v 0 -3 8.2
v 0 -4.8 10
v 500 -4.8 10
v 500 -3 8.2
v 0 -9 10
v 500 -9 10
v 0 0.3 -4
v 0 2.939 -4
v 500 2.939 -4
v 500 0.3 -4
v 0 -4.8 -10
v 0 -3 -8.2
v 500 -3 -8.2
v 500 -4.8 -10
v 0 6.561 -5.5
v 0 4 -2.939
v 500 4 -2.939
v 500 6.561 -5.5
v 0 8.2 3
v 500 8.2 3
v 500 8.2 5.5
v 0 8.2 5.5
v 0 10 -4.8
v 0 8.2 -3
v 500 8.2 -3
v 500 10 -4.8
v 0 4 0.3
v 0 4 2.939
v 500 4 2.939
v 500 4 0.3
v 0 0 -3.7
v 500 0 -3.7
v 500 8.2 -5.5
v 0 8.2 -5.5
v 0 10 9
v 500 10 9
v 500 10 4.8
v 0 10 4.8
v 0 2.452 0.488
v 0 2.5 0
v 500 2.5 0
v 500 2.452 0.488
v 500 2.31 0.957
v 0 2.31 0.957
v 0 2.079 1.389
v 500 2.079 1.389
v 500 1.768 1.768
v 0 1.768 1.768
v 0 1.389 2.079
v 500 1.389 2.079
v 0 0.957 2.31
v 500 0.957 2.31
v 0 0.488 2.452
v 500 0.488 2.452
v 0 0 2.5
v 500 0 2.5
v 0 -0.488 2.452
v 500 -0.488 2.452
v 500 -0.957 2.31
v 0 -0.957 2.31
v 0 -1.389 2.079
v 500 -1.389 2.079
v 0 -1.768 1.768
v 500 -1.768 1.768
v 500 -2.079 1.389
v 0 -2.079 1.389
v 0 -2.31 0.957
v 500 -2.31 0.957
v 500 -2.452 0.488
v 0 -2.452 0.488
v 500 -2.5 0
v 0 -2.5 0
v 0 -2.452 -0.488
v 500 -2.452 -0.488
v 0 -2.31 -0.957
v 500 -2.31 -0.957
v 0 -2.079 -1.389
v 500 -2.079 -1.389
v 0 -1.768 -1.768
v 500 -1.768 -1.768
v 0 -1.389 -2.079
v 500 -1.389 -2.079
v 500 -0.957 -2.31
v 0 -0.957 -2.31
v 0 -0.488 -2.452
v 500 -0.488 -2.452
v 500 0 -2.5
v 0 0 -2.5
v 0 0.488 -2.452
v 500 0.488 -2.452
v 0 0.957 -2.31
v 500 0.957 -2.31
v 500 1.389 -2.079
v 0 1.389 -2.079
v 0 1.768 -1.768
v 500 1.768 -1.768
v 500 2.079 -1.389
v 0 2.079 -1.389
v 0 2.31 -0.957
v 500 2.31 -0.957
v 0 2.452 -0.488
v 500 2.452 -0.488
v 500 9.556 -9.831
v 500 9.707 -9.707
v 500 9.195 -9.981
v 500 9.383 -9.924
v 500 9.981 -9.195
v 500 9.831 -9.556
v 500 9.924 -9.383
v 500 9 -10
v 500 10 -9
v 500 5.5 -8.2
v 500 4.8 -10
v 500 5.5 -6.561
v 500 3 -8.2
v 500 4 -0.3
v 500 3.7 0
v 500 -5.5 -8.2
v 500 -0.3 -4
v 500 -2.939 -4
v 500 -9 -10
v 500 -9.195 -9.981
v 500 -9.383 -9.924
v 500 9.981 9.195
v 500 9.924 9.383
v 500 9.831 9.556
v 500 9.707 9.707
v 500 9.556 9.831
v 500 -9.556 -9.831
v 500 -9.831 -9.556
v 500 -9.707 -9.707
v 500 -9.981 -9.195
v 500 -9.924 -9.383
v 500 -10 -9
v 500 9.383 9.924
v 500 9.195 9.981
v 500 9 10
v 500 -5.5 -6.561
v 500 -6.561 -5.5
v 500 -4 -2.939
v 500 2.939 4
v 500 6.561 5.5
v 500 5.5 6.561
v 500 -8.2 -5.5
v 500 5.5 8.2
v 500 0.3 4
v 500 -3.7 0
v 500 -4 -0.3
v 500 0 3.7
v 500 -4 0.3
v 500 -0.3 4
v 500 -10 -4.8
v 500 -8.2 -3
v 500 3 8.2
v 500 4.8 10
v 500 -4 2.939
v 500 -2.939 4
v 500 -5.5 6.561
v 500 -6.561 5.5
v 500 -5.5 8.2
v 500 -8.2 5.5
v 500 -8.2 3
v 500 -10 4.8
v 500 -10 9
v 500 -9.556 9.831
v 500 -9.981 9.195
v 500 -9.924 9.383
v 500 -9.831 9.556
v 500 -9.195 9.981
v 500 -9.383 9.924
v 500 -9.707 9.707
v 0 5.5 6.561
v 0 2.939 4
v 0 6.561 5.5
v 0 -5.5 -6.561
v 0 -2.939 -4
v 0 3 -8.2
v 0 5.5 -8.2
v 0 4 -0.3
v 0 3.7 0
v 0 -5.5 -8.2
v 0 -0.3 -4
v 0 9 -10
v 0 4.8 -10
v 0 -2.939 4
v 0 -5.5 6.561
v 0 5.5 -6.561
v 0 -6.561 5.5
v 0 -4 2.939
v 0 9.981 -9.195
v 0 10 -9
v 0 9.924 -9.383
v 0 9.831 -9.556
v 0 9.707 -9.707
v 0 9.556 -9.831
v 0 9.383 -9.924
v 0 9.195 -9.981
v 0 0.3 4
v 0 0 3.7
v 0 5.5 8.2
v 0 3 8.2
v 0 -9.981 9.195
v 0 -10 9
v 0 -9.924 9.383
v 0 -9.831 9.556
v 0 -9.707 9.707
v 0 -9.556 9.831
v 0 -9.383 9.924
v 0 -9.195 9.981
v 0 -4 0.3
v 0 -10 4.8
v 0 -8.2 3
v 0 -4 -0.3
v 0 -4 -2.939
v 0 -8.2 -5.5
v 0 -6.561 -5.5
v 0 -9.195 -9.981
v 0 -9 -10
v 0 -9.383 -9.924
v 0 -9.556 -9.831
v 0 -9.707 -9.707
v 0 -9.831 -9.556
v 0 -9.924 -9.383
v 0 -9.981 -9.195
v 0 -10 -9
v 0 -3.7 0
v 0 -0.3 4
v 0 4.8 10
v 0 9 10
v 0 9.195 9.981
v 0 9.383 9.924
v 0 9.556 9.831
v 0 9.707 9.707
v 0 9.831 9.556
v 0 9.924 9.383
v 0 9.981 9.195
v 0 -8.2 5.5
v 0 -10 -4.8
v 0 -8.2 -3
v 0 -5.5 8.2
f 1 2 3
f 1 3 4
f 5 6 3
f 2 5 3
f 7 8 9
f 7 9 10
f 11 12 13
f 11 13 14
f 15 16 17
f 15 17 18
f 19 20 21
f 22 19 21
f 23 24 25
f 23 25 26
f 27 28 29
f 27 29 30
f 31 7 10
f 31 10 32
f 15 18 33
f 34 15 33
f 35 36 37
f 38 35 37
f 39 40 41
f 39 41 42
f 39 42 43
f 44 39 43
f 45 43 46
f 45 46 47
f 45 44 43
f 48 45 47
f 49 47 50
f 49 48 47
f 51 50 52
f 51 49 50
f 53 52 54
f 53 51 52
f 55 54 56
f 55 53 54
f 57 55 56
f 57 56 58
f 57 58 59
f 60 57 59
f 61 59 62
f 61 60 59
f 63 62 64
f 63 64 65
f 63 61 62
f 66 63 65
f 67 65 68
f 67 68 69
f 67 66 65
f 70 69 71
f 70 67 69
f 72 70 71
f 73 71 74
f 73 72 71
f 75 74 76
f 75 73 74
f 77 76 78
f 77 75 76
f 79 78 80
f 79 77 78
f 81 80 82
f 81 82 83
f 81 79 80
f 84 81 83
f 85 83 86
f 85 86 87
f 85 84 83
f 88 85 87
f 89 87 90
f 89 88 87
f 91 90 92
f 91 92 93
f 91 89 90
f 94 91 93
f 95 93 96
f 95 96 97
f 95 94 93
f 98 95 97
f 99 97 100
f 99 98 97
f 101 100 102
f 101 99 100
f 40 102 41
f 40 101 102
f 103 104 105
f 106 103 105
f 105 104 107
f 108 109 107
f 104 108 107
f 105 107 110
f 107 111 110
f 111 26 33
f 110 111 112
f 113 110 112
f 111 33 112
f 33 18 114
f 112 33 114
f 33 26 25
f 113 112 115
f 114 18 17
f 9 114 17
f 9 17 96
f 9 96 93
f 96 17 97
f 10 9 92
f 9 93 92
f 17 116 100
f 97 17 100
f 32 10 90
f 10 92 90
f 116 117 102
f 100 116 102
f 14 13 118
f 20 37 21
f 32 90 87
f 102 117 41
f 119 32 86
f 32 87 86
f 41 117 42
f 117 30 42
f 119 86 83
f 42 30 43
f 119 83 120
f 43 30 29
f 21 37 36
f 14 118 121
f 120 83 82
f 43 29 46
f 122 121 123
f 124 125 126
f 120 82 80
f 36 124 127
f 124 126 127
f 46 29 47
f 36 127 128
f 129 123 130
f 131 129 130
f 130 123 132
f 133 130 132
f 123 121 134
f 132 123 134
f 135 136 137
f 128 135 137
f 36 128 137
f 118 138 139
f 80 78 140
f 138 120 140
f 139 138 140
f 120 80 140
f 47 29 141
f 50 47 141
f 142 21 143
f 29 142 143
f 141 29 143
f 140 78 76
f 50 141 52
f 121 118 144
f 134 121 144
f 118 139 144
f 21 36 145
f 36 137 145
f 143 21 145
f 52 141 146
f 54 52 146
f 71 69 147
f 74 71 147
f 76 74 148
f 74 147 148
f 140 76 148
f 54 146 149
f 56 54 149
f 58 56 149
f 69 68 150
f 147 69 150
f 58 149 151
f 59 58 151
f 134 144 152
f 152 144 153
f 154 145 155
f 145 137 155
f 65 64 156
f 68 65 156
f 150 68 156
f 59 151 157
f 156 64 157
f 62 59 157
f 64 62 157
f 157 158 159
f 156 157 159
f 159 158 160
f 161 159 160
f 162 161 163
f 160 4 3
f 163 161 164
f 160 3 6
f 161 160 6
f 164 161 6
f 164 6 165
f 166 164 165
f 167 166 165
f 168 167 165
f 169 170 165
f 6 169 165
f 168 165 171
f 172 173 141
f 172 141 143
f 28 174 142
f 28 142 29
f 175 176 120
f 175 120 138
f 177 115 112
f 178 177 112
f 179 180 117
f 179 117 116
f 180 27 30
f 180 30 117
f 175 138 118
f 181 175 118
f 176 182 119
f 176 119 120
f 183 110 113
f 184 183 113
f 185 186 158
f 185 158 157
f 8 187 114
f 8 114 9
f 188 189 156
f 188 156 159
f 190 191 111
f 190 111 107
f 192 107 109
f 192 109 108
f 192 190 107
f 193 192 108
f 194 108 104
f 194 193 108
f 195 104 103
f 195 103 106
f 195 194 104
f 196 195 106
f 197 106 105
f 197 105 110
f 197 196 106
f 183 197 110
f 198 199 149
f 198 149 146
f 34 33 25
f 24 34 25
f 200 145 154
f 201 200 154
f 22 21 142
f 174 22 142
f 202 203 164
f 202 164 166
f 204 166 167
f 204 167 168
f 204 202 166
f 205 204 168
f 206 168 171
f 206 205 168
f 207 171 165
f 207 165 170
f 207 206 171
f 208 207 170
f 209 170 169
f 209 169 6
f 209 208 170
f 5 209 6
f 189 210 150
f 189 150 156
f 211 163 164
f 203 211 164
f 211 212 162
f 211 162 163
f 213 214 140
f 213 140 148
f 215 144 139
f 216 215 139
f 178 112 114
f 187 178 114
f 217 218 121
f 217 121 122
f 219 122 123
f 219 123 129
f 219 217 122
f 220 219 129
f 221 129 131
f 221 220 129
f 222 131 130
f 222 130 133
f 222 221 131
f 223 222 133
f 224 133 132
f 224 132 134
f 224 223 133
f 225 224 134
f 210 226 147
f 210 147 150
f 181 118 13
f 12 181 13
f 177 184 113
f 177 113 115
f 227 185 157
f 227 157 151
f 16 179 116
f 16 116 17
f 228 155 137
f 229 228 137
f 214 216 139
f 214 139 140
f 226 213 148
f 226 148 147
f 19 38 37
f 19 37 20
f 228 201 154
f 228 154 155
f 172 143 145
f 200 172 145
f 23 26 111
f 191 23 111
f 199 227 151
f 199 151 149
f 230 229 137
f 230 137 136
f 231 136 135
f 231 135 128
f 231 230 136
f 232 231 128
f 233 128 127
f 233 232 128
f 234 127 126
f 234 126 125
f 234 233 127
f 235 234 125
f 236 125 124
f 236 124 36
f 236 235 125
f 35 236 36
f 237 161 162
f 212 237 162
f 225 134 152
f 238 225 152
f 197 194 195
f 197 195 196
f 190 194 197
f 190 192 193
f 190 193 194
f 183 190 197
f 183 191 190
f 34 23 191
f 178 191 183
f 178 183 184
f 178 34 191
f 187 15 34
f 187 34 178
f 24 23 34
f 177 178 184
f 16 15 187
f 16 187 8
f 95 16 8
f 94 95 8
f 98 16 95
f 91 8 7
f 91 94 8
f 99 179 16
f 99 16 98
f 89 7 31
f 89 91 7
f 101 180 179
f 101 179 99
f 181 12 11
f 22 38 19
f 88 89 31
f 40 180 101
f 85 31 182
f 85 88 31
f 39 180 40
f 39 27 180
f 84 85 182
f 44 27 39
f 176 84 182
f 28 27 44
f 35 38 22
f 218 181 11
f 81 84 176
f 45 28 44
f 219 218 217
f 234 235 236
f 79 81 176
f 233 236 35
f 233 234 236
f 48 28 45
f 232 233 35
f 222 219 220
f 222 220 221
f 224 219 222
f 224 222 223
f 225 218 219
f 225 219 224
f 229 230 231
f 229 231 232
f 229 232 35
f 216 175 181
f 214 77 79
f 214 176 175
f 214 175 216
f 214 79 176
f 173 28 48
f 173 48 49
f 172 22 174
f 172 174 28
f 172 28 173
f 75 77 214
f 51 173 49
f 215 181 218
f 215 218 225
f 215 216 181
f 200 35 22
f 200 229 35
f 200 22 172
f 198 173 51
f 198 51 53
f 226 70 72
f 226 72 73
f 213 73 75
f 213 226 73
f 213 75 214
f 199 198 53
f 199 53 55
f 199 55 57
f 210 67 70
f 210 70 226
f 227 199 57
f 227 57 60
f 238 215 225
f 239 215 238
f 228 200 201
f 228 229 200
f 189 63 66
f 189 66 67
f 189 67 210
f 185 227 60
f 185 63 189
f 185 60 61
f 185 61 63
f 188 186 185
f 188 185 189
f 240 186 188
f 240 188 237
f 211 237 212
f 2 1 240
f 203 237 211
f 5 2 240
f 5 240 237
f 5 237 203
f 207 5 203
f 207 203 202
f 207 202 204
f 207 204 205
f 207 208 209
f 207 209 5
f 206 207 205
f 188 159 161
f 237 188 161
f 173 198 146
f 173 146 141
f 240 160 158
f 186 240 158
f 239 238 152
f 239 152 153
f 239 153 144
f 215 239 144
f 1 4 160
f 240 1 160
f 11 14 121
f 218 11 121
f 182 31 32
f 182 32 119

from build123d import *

# Parameters (mm, degrees)
SKETCH11_R                                    = 2.5
C_USERS_USER_GOOGLE_DRIVE_13_INFORMA_ES_DEPTH = 500


with BuildPart() as part:
    # Sketch11 → C_USERS_USER_GOOGLE DRIVE_13. INFORMA_ES (new body)
    with BuildSketch(Plane.YZ):
        with BuildLine():
            Line((-4.8, 10), (-3, 8.2))
            Line((-3, 8.2), (-5.5, 8.2))
            Line((-5.5, 8.2), (-5.5, 6.560660172))
            Line((-5.5, 6.560660172), (-2.939339828, 4))
            Line((-2.939339828, 4), (-0.3, 4))
            Line((-0.3, 4), (0, 3.7))
            Line((0, 3.7), (0.3, 4))
            Line((0.3, 4), (2.939339828, 4))
            Line((2.939339828, 4), (5.5, 6.560660172))
            Line((5.5, 6.560660172), (5.5, 8.2))
            Line((5.5, 8.2), (3, 8.2))
            Line((3, 8.2), (4.8, 10))
            Line((4.8, 10), (9, 10))
            ThreePointArc((9, 10), (9.707106781, 9.707106781), (10, 9))
            Line((10, 9), (10, 4.8))
            Line((10, 4.8), (8.2, 3))
            Line((8.2, 3), (8.2, 5.5))
            Line((8.2, 5.5), (6.560660172, 5.5))
            Line((6.560660172, 5.5), (4, 2.939339828))
            Line((4, 2.939339828), (4, 0.3))
            Line((4, 0.3), (3.7, 0))
            Line((3.7, 0), (4, -0.3))
            Line((4, -0.3), (4, -2.939339828))
            Line((4, -2.939339828), (6.560660172, -5.5))
            Line((6.560660172, -5.5), (8.2, -5.5))
            Line((8.2, -5.5), (8.2, -3))
            Line((8.2, -3), (10, -4.8))
            Line((10, -4.8), (10, -9))
            ThreePointArc((10, -9), (9.707106781, -9.707106781), (9, -10))
            Line((9, -10), (4.8, -10))
            Line((4.8, -10), (3, -8.2))
            Line((3, -8.2), (5.5, -8.2))
            Line((5.5, -8.2), (5.5, -6.560660172))
            Line((5.5, -6.560660172), (2.939339828, -4))
            Line((2.939339828, -4), (0.3, -4))
            Line((0.3, -4), (0, -3.7))
            Line((0, -3.7), (-0.3, -4))
            Line((-0.3, -4), (-2.939339828, -4))
            Line((-2.939339828, -4), (-5.5, -6.560660172))
            Line((-5.5, -6.560660172), (-5.5, -8.2))
            Line((-5.5, -8.2), (-3, -8.2))
            Line((-3, -8.2), (-4.8, -10))
            Line((-4.8, -10), (-9, -10))
            ThreePointArc((-9, -10), (-9.707106781, -9.707106781), (-10, -9))
            Line((-10, -9), (-10, -4.8))
            Line((-10, -4.8), (-8.2, -3))
            Line((-8.2, -3), (-8.2, -5.5))
            Line((-8.2, -5.5), (-6.560660172, -5.5))
            Line((-6.560660172, -5.5), (-4, -2.939339828))
            Line((-4, -2.939339828), (-4, -0.3))
            Line((-4, -0.3), (-3.7, 0))
            Line((-3.7, 0), (-4, 0.3))
            Line((-4, 0.3), (-4, 2.939339828))
            Line((-4, 2.939339828), (-6.560660172, 5.5))
            Line((-6.560660172, 5.5), (-8.2, 5.5))
            Line((-8.2, 5.5), (-8.2, 3))
            Line((-8.2, 3), (-10, 4.8))
            Line((-10, 4.8), (-10, 9))
            ThreePointArc((-10, 9), (-9.707106781, 9.707106781), (-9, 10))
            Line((-9, 10), (-4.8, 10))
        make_face()
        Circle(SKETCH11_R, mode=Mode.SUBTRACT)
    extrude(amount=C_USERS_USER_GOOGLE_DRIVE_13_INFORMA_ES_DEPTH)


solid = part.part
